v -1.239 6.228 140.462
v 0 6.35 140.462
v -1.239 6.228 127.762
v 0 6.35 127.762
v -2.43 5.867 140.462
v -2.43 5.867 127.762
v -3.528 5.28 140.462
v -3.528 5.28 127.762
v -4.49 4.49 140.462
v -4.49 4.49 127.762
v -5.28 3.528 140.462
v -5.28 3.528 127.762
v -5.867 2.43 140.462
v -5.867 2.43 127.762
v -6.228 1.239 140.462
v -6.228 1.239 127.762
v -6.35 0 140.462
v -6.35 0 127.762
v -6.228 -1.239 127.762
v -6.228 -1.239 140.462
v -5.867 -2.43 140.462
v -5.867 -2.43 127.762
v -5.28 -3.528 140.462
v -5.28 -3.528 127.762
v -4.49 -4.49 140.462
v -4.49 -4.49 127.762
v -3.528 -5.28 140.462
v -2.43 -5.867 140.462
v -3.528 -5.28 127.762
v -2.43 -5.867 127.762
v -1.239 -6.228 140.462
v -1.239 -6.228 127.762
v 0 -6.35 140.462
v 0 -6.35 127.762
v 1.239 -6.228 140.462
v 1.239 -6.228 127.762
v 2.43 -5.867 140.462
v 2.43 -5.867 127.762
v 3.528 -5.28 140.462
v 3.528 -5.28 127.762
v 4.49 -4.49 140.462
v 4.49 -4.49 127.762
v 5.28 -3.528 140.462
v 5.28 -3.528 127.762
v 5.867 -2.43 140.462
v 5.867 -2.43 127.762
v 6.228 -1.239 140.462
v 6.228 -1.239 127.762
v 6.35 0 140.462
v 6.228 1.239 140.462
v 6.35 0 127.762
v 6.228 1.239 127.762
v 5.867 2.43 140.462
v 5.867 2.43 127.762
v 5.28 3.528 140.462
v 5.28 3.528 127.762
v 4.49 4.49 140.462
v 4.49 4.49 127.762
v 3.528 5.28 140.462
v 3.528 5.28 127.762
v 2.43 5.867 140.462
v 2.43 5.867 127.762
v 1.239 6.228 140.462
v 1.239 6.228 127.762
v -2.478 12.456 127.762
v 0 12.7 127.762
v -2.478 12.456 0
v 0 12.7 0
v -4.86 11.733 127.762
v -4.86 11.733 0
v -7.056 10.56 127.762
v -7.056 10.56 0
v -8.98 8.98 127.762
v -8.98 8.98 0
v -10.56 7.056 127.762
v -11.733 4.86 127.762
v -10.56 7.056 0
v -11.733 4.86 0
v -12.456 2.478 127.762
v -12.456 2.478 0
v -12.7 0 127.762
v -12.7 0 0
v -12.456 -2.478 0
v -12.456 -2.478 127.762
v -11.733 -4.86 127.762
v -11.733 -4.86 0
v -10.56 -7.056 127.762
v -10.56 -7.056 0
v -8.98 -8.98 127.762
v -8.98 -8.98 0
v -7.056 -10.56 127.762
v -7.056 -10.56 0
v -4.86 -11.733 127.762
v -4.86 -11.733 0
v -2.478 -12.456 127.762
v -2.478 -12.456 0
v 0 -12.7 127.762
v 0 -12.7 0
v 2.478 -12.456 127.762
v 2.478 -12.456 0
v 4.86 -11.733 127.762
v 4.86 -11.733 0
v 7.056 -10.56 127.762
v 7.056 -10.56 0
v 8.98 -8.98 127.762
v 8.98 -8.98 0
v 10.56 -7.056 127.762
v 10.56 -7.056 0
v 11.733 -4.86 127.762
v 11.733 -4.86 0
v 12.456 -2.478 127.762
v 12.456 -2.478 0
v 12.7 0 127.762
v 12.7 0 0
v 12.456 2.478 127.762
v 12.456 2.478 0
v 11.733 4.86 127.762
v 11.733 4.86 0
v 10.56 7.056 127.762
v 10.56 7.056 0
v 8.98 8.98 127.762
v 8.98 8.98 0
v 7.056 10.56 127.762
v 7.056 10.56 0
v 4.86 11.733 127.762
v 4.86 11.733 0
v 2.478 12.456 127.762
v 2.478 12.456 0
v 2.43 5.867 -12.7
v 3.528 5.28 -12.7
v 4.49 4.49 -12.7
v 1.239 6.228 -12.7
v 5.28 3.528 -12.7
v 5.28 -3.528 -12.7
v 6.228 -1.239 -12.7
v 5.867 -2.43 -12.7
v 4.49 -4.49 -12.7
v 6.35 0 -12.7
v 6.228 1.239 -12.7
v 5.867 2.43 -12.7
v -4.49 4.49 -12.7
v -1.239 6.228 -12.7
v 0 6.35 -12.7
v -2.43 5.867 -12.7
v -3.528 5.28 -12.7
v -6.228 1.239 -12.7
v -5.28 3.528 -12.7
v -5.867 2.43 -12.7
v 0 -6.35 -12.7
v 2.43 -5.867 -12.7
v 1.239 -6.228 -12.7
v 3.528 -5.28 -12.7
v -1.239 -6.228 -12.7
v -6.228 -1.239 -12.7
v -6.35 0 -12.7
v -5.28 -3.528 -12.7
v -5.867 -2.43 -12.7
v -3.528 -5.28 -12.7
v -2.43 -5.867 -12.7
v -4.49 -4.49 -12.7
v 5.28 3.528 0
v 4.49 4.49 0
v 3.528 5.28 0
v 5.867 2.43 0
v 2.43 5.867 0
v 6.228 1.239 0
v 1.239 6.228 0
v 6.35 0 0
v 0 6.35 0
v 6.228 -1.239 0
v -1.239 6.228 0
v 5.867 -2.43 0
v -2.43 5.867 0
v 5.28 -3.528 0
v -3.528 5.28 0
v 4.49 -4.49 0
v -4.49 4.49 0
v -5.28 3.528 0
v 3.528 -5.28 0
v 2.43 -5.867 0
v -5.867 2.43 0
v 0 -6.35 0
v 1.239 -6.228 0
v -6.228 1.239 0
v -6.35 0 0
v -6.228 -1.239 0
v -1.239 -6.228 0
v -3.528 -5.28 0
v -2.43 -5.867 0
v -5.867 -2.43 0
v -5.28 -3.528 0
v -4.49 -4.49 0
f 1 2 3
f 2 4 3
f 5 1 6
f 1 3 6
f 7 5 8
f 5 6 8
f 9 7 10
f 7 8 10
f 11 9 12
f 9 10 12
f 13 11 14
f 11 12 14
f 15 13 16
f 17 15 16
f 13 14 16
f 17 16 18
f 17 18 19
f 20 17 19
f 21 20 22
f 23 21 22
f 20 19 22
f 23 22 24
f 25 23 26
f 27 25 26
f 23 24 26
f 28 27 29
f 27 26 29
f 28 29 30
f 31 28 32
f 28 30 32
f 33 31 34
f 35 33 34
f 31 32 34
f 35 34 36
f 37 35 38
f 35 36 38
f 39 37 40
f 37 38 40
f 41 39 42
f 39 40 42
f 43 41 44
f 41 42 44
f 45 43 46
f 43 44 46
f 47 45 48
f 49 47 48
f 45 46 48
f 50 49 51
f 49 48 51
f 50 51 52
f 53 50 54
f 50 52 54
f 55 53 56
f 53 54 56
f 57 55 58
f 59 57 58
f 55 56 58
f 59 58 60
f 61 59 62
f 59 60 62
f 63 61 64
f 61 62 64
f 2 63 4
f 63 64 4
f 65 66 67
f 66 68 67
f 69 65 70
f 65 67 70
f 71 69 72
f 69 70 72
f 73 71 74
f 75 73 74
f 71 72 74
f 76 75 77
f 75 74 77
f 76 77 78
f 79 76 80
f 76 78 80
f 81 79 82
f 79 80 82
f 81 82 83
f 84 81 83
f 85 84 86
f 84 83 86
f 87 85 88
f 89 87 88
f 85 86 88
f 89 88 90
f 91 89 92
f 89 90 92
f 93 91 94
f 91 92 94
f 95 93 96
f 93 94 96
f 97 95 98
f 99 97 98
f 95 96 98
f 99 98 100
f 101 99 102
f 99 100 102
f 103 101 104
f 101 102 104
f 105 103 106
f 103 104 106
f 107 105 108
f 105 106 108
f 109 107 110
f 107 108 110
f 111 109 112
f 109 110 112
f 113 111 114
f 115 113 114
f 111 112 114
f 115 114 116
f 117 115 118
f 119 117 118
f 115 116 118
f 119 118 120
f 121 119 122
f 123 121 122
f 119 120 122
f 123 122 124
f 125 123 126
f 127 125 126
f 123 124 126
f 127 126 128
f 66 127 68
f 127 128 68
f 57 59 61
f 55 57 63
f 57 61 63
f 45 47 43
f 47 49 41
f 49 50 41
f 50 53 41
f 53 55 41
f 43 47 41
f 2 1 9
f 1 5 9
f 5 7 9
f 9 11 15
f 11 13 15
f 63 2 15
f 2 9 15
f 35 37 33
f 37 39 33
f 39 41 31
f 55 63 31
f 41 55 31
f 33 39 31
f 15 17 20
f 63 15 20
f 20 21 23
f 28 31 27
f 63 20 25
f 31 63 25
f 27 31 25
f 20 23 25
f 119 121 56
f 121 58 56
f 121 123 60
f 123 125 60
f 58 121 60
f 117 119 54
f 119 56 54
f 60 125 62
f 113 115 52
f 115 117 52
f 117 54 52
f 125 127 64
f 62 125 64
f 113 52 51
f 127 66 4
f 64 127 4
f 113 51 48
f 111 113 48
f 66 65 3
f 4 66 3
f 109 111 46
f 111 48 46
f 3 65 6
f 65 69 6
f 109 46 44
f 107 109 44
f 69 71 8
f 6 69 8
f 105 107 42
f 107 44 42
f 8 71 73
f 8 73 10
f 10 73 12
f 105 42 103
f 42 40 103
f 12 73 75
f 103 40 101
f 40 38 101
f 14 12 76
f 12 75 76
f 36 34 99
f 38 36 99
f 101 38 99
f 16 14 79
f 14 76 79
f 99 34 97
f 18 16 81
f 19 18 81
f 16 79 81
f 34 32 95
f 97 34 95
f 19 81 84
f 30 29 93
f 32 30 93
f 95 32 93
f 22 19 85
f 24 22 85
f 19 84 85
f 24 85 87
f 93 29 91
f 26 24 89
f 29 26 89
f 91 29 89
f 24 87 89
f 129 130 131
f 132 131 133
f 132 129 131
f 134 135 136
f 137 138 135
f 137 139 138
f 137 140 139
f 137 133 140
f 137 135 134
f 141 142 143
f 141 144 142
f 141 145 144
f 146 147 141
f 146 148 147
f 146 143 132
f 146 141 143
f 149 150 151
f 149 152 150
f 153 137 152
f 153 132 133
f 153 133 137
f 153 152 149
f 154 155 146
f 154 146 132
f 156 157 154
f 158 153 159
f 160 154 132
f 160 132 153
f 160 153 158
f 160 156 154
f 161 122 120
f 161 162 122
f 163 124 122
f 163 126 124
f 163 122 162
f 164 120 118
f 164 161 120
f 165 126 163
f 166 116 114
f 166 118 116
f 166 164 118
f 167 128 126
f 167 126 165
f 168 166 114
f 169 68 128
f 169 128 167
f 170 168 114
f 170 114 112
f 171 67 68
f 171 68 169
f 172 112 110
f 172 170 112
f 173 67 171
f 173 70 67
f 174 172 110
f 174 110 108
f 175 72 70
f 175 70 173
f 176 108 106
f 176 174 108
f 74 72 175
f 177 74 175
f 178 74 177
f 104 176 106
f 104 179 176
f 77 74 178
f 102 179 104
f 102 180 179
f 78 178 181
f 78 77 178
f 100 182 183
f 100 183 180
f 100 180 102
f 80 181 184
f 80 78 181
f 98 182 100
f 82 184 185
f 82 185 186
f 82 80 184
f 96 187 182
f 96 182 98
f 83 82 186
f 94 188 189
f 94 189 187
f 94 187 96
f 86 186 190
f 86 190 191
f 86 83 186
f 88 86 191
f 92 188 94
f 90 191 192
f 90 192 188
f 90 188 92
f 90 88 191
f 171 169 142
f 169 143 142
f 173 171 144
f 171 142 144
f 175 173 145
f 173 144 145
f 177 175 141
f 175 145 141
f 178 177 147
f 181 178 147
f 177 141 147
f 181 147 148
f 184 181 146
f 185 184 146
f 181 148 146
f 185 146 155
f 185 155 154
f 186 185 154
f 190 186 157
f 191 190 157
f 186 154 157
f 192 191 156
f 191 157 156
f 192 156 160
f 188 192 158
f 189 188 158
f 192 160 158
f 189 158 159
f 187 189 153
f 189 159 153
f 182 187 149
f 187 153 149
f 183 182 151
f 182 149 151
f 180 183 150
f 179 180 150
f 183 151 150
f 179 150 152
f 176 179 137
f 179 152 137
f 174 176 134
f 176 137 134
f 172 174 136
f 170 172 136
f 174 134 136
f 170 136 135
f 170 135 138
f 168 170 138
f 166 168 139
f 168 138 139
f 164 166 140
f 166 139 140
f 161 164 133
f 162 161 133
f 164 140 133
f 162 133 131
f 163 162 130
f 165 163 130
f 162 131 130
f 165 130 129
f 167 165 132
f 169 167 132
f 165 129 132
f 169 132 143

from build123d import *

# Parameters (mm, degrees)
SKETCH1_W   = 12.7
SKETCH1_H   = 6.35
SKETCH1_W_2 = 127.762
SKETCH1_H_2 = 12.7


with BuildPart() as part:
    # Sketch1 → Revolve1 (revolve)
    with BuildSketch(Plane(origin=(0, 0, 0), x_dir=(0, 0, -1), z_dir=(1, 0, 0))):
        with Locations((-134.112, 3.175)):
            Rectangle(SKETCH1_W, SKETCH1_H)
        with Locations((-63.881, 6.35)):
            Rectangle(SKETCH1_W_2, SKETCH1_H_2)
        with Locations((6.35, 3.175)):
            Rectangle(SKETCH1_W, SKETCH1_H)
    revolve(axis=Axis((0, 0, 0), (0, 0, 1)))


solid = part.part
